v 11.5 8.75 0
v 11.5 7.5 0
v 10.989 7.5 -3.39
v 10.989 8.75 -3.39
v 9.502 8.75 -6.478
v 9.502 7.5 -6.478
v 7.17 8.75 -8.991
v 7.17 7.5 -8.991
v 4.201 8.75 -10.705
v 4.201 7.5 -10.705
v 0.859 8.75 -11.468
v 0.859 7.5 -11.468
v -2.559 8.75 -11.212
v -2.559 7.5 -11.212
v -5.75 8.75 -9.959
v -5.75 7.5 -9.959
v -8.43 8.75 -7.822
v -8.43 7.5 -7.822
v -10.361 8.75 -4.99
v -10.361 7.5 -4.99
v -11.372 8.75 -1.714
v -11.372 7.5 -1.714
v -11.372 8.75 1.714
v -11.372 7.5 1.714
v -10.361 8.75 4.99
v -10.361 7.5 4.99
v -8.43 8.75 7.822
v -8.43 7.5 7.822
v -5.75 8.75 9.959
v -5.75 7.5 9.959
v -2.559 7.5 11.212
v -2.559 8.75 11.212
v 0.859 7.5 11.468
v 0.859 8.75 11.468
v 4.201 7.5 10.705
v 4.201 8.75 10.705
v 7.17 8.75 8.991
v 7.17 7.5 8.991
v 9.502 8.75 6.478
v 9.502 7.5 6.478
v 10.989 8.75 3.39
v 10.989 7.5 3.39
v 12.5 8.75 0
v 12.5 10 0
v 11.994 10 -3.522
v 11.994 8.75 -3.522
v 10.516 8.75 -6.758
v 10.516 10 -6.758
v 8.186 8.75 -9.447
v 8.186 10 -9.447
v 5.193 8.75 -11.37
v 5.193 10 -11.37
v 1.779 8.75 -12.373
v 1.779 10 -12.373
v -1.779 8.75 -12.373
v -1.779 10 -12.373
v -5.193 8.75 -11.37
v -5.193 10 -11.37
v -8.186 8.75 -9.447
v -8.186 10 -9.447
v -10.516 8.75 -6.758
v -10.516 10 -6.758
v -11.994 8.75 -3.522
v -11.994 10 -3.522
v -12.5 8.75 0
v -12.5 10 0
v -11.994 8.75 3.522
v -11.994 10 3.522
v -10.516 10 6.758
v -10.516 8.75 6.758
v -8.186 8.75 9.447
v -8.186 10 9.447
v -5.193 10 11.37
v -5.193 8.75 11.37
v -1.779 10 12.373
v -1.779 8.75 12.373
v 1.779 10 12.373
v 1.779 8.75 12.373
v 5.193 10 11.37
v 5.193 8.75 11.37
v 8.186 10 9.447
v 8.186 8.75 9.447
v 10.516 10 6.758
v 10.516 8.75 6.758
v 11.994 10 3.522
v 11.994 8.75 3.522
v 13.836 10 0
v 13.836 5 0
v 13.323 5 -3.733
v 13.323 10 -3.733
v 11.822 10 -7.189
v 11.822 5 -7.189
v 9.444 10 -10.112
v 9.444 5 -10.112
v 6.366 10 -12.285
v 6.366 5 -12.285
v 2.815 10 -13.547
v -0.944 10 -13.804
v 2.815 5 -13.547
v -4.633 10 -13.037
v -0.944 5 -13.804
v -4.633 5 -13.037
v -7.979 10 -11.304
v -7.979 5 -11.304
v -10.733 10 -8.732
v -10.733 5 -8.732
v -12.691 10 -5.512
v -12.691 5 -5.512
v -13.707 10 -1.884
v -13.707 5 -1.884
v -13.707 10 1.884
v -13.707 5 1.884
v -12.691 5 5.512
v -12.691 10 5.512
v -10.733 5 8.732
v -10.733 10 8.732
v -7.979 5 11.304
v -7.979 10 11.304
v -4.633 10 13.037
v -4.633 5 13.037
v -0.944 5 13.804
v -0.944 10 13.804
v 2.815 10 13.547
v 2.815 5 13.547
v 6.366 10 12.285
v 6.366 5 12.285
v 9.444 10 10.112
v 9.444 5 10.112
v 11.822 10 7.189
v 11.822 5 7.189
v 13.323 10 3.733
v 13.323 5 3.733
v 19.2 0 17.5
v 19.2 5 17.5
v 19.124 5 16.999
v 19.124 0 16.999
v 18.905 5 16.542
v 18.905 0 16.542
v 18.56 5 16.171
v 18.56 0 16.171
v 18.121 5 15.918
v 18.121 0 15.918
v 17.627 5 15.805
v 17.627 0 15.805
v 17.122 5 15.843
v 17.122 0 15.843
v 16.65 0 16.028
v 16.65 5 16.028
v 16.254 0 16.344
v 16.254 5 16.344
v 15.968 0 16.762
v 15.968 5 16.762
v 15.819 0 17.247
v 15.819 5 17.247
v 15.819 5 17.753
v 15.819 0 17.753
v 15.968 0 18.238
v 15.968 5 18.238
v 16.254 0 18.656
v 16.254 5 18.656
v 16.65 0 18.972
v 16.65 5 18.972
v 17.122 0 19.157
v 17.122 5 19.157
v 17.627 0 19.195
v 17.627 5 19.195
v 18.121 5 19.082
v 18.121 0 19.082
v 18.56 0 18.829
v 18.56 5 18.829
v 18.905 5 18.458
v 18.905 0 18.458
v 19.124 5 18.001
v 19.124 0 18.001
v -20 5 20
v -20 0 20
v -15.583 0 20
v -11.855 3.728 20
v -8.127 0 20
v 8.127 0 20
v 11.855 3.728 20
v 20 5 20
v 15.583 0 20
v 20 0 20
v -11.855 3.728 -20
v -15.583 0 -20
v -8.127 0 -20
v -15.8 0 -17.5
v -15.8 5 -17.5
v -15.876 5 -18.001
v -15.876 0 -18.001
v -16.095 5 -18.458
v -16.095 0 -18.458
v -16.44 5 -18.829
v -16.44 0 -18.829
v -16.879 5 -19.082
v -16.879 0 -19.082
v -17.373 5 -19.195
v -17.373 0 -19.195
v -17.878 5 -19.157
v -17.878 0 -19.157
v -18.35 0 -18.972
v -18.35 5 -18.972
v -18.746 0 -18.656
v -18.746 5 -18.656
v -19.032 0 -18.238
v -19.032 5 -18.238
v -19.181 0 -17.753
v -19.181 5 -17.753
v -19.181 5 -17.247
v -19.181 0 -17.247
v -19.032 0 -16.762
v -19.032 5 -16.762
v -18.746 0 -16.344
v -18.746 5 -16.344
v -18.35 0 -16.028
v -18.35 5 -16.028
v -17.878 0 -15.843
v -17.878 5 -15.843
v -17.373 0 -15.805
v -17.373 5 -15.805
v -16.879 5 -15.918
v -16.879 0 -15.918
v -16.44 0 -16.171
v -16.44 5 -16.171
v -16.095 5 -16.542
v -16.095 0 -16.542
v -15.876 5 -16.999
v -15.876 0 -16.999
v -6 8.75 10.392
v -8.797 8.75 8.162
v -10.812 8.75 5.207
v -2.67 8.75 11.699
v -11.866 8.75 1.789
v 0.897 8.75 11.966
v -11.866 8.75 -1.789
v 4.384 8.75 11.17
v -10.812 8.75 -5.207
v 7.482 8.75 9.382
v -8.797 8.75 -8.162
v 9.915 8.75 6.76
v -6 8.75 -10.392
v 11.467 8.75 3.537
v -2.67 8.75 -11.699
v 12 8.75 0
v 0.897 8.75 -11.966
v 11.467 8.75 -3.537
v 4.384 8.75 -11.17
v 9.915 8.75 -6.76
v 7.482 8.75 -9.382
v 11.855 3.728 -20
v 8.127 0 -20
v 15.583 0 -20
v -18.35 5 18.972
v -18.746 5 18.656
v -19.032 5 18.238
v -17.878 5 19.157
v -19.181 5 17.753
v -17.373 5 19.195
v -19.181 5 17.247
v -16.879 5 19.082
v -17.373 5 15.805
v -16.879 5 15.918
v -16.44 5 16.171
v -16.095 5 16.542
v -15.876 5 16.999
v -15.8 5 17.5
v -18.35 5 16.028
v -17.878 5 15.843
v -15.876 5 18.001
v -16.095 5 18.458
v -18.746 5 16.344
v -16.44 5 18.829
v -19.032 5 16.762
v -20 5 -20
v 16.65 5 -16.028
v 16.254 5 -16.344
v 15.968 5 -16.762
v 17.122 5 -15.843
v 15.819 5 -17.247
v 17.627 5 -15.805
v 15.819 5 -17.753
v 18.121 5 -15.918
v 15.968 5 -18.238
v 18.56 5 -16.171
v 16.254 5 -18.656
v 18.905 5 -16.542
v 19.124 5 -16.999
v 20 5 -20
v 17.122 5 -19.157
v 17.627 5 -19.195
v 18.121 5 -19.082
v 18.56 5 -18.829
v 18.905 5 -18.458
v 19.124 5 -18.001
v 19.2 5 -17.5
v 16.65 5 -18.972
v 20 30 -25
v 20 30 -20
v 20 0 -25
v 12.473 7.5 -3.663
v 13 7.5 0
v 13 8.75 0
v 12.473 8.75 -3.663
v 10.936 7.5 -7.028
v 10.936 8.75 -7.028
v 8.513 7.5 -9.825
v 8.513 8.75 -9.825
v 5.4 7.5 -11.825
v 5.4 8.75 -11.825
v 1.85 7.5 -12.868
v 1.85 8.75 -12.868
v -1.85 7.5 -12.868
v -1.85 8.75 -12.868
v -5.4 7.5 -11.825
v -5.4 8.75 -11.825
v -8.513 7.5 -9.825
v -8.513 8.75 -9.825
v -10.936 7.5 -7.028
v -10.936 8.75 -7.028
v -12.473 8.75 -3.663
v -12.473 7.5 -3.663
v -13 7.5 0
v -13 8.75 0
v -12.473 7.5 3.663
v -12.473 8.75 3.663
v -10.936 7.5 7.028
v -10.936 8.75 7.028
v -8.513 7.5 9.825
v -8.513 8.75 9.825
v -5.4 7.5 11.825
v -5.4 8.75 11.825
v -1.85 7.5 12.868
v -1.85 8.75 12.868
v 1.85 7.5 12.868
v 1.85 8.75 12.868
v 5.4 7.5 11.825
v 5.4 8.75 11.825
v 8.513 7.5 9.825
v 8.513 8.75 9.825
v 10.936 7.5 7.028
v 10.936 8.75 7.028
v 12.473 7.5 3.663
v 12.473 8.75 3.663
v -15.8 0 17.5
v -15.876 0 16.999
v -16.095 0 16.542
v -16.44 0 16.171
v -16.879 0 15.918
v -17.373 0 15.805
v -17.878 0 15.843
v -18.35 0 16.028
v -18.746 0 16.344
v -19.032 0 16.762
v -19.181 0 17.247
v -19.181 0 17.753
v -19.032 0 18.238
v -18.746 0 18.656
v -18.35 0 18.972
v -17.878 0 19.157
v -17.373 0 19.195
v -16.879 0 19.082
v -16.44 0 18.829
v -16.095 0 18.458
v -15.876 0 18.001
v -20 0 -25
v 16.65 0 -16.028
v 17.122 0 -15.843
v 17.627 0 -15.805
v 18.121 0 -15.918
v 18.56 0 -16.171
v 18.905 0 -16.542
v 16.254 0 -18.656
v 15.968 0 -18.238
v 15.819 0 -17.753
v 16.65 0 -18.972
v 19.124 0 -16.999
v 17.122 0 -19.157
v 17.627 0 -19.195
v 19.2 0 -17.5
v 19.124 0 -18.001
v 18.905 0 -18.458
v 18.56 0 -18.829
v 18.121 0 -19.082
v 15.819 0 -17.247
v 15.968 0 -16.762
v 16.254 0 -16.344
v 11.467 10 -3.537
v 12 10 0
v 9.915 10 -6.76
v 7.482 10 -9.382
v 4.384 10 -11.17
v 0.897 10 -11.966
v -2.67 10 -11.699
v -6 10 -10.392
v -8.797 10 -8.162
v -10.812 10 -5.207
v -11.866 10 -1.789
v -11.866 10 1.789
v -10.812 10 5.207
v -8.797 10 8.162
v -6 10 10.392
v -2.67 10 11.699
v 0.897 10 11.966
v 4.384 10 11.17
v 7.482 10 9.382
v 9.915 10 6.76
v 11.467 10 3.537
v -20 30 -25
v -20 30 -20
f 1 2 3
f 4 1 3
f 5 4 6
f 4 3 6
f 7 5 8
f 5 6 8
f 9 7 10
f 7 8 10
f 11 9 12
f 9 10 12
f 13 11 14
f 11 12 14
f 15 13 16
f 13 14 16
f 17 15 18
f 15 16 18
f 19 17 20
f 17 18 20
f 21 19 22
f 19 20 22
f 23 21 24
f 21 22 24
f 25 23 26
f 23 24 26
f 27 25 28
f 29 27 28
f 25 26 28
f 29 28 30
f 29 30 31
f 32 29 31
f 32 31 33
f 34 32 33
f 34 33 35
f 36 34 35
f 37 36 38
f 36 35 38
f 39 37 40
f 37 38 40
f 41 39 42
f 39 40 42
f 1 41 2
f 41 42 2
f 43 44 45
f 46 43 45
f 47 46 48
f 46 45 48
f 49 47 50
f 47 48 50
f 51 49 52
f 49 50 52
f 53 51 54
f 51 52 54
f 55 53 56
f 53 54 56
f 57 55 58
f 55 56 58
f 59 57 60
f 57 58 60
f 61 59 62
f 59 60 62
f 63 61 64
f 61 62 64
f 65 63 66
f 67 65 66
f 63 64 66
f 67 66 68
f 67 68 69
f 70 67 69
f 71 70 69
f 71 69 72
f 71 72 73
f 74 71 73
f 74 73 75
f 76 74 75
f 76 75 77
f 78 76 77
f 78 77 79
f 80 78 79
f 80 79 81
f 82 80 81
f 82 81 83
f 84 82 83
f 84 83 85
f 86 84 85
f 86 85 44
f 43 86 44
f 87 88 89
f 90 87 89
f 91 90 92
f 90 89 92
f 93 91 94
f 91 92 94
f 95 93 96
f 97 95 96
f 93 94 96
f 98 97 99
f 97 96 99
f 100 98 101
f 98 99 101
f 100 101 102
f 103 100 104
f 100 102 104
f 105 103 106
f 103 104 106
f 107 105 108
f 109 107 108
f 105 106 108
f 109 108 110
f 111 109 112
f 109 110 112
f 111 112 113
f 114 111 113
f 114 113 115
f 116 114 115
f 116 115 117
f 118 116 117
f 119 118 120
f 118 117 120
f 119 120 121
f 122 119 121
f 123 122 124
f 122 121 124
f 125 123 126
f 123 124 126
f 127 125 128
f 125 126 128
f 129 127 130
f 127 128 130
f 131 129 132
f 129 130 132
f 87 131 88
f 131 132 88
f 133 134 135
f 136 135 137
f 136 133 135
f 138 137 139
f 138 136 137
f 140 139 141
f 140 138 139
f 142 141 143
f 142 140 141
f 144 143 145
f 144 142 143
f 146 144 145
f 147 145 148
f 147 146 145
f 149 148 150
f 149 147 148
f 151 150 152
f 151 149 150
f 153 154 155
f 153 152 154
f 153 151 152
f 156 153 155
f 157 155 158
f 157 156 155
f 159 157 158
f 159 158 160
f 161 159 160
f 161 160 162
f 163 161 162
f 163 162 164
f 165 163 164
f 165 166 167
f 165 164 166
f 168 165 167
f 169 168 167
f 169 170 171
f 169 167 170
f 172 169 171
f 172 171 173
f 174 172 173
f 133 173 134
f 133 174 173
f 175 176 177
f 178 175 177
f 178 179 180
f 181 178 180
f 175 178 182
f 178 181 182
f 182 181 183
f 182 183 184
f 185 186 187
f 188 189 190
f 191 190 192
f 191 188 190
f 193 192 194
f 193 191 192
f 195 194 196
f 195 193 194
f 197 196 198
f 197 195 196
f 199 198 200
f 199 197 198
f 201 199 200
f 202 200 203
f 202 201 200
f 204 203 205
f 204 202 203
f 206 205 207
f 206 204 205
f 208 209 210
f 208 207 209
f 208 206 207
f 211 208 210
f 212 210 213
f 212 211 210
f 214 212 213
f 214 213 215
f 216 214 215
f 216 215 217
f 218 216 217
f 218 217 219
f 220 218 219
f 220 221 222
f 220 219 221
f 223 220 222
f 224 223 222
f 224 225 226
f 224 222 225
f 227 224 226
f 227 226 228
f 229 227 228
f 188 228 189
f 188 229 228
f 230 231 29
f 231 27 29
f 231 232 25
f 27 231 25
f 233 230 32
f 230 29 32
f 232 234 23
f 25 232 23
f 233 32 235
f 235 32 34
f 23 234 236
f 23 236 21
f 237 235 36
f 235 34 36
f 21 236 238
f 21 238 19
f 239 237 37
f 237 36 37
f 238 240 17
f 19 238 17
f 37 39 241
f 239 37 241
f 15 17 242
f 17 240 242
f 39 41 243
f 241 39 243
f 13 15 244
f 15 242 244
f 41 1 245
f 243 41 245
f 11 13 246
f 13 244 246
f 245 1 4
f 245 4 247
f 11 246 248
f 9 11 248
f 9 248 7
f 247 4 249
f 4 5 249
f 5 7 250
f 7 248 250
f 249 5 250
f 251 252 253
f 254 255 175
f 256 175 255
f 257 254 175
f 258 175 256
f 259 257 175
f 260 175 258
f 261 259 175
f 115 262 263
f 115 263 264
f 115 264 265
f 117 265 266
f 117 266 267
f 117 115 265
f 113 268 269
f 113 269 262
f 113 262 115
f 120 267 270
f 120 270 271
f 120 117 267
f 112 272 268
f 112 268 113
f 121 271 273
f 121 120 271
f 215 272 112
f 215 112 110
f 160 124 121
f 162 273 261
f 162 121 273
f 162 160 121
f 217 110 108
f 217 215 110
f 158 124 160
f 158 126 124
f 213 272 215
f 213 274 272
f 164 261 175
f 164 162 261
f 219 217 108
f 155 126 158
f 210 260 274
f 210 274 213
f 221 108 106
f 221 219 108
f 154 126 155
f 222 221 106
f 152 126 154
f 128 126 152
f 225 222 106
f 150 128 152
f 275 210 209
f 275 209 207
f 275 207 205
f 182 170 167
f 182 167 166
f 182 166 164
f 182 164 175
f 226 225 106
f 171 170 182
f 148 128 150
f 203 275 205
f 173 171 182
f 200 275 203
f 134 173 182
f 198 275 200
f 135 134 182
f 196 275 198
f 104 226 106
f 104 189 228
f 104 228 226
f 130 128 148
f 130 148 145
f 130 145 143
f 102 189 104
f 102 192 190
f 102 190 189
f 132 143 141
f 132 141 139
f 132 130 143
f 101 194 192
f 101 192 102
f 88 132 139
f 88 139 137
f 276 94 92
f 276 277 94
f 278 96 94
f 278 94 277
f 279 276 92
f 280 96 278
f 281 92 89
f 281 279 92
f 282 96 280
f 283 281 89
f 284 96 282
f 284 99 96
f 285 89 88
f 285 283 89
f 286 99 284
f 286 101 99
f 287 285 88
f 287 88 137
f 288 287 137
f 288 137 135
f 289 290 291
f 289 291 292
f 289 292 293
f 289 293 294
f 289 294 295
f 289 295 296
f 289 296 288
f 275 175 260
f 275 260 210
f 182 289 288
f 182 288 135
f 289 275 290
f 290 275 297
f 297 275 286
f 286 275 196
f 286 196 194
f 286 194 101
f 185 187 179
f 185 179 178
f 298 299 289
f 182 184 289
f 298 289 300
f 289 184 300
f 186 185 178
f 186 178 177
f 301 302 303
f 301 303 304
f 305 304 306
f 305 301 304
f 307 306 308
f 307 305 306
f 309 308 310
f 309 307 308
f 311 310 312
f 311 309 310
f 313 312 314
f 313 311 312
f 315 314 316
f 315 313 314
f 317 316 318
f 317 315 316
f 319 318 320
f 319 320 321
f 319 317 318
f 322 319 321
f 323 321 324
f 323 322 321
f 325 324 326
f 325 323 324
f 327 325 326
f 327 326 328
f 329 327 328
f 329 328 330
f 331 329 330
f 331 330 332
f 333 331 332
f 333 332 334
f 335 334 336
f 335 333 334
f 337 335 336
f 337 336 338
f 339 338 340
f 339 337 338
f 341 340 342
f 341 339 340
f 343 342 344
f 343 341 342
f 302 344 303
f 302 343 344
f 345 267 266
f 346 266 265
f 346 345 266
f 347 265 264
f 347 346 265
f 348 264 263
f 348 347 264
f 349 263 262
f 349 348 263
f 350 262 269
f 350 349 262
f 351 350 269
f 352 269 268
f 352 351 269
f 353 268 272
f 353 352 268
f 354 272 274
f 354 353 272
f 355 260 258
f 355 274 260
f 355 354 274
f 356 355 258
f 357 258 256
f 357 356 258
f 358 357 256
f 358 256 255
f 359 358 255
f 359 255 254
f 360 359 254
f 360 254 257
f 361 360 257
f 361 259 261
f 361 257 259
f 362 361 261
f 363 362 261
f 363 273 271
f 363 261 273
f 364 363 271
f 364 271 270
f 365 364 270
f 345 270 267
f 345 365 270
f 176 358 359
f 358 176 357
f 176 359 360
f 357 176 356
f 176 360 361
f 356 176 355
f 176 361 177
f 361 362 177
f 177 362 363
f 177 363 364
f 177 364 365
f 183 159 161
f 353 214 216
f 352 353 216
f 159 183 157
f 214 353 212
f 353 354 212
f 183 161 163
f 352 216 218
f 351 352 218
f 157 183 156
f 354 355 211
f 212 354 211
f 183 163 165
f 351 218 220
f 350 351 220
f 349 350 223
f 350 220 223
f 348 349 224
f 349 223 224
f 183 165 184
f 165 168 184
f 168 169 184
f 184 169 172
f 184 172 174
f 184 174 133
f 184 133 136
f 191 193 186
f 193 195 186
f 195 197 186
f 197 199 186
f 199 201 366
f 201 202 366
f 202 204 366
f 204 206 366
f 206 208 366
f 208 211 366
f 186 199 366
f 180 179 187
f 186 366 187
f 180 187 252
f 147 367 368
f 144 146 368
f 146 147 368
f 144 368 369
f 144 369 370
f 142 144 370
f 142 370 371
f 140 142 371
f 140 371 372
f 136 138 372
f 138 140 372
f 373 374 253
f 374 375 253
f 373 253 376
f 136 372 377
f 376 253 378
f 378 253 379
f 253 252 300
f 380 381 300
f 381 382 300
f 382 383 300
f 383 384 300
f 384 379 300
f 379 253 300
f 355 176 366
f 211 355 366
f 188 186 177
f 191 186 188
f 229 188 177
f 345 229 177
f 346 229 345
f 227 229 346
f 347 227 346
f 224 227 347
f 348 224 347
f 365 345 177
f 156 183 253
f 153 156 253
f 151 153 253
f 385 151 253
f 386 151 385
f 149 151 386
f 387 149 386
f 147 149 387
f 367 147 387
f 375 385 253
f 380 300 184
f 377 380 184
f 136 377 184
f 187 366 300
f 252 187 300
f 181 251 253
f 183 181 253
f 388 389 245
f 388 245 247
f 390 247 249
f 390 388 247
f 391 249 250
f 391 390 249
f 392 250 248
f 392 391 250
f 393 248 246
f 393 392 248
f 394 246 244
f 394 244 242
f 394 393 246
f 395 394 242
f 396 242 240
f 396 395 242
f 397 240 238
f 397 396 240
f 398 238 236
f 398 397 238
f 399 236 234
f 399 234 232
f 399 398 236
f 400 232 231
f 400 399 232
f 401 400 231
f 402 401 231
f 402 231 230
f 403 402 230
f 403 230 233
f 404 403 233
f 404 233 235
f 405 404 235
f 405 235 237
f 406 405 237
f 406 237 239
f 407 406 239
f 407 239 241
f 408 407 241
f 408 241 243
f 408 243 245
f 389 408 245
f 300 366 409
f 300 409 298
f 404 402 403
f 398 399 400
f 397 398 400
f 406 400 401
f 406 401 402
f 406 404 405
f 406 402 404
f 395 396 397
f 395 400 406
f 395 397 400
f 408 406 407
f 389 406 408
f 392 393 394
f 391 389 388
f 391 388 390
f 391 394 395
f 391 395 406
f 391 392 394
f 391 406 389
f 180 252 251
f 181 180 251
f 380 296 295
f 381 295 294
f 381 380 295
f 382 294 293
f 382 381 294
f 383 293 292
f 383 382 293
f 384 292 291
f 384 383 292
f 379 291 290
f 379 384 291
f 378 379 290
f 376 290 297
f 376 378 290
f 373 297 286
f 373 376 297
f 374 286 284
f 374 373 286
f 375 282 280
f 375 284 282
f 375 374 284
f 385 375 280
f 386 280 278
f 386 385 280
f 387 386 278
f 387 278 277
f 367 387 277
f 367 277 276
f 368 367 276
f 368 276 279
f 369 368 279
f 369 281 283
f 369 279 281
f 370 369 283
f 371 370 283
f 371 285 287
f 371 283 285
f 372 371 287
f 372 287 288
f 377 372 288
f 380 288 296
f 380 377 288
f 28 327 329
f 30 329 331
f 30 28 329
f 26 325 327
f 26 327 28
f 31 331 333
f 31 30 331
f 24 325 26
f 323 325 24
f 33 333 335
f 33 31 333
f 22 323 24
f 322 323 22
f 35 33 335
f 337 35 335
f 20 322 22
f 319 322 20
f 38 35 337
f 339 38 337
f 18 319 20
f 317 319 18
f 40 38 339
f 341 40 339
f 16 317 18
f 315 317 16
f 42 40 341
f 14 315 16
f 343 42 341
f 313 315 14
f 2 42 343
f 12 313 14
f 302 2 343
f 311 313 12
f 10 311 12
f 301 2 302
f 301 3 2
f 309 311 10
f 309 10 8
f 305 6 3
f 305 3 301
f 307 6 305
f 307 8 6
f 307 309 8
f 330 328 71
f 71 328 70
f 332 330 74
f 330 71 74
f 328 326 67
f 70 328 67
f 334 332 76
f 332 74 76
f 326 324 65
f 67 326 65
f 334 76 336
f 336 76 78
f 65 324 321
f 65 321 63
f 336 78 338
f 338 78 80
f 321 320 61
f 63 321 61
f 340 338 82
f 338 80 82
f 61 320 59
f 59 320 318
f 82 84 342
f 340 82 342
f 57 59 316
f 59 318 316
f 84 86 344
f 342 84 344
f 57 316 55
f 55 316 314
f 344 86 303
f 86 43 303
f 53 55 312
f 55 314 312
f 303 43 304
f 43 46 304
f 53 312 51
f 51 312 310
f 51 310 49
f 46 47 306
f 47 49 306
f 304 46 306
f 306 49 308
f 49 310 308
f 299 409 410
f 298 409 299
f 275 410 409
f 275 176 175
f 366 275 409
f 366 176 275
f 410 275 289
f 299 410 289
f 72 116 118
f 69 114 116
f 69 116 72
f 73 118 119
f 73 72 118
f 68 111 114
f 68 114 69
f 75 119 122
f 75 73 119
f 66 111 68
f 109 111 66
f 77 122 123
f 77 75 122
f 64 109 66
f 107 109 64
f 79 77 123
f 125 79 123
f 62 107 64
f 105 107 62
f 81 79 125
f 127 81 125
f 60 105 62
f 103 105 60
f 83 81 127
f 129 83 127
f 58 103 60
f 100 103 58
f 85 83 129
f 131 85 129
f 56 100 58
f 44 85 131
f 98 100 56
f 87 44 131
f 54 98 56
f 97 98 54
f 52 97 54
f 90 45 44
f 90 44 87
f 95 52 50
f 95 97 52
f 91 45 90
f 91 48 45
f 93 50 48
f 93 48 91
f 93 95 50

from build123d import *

# Parameters (mm, degrees)
SKETCH_5_W               = 40
SKETCH_5_H               = 40
EXTRUDE_2_DEPTH          = 5
CUT_EXTRUDE_2_DEPTH      = 21
CUT_EXTRUDE_2_DEPTH_BACK = 21
SKETCH_7_R               = 1.7
CUT_EXTRUDE_4_DEPTH      = 6
CUT_EXTRUDE_4_DEPTH_BACK = 1
SKETCH_8_R               = 13.836233659
EXTRUDE_3_DEPTH          = 5
SKETCH_9_R               = 12.5
SKETCH_9_R_2             = 12
CUT_EXTRUDE_5_DEPTH      = 2.5
SKETCH_11_R              = 13
SKETCH_11_R_2            = 11.5
CUT_EXTRUDE_6_DEPTH      = 1.25
SKETCH_13_W              = 40
SKETCH_13_H              = 5
EXTRUDE_5_DEPTH          = 30


with BuildPart() as part:
    # Эскиз5 → Бобышка-Вытянуть2 (new body)
    with BuildSketch(Plane(origin=(0, 0, 0), x_dir=(1, 0, 0), z_dir=(0, 1, 0))):
        Rectangle(SKETCH_5_W, SKETCH_5_H)
    extrude(amount=EXTRUDE_2_DEPTH)

    # Эскиз6 → Вырез-Вытянуть2 (cut, two sides)
    with BuildSketch(Plane.XY) as cut_extrude_2_sk:
        Polygon((8.127281001, 0), (11.855143598, 3.727862597), (15.583006195, 0), align=None)
        Polygon((-8.127281001, 0), (-11.855143598, 3.727862597), (-15.583006195, 0), align=None)
    extrude(amount=CUT_EXTRUDE_2_DEPTH, mode=Mode.SUBTRACT)
    extrude(cut_extrude_2_sk.sketch, amount=-CUT_EXTRUDE_2_DEPTH_BACK, mode=Mode.SUBTRACT)

    # Эскиз7 → Вырез-Вытянуть4 (cut, two sides)
    with BuildSketch(Plane(origin=(0, 0, 0), x_dir=(1, 0, 0), z_dir=(0, 1, 0))) as cut_extrude_4_sk:
        with Locations((-17.5, -17.5)):
            Circle(SKETCH_7_R)
        with Locations((-17.5, 17.5)):
            Circle(SKETCH_7_R)
        with Locations((17.5, 17.5)):
            Circle(SKETCH_7_R)
        with Locations((17.5, -17.5)):
            Circle(SKETCH_7_R)
    extrude(amount=CUT_EXTRUDE_4_DEPTH, mode=Mode.SUBTRACT)
    extrude(cut_extrude_4_sk.sketch, amount=-CUT_EXTRUDE_4_DEPTH_BACK, mode=Mode.SUBTRACT)

    # Эскиз8 → Бобышка-Вытянуть3 (add)
    with BuildSketch(Plane(origin=(0, 5, 0), x_dir=(1, 0, 0), z_dir=(0, 1, 0))):
        Circle(SKETCH_8_R)
    extrude(amount=EXTRUDE_3_DEPTH)

    # Эскиз9 → Вырез-Вытянуть5 (cut)
    with BuildSketch(Plane(origin=(0, 10, 0), x_dir=(1, 0, 0), z_dir=(0, 1, 0))):
        Circle(SKETCH_9_R)
        Circle(SKETCH_9_R_2, mode=Mode.SUBTRACT)
    extrude(amount=-CUT_EXTRUDE_5_DEPTH, mode=Mode.SUBTRACT)

    # Эскиз11 → Вырез-Вытянуть6 (cut)
    with BuildSketch(Plane(origin=(0, 7.5, 0), x_dir=(1, 0, 0), z_dir=(0, 1, 0))):
        Circle(SKETCH_11_R)
        Circle(SKETCH_11_R_2, mode=Mode.SUBTRACT)
    extrude(amount=CUT_EXTRUDE_6_DEPTH, mode=Mode.SUBTRACT)

    # Эскиз13 → Бобышка-Вытянуть5 (add)
    with BuildSketch(Plane(origin=(0, 0, 0), x_dir=(1, 0, 0), z_dir=(0, 1, 0))):
        with Locations((0, 22.5)):
            Rectangle(SKETCH_13_W, SKETCH_13_H)
    extrude(amount=EXTRUDE_5_DEPTH)


solid = part.part
